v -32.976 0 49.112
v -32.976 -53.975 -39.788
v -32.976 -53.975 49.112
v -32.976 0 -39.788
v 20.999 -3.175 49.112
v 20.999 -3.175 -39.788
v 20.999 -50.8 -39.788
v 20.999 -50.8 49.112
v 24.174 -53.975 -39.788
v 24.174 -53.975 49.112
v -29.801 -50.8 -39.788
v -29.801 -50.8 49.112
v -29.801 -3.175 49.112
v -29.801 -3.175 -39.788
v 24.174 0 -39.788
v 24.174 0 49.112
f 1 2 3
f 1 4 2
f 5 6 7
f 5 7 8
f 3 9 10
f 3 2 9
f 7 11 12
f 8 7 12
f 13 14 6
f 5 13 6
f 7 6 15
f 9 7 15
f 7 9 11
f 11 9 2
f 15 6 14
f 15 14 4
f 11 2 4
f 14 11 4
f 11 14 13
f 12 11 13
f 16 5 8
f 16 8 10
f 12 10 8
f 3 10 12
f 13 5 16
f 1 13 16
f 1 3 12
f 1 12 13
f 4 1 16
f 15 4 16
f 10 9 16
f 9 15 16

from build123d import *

# Parameters (mm, degrees)
F0_W     = 57.15
F0_H     = 88.9
F1_DEPTH = 3.175
F2_W     = 3.175
F2_H     = 88.9
F3_DEPTH = 50.8
F4_W     = 3.175
F4_H     = 88.9
F5_DEPTH = 50.8
F6_W     = 3.175
F6_H     = 88.9
F7_DEPTH = 50.8


with BuildPart() as f1:
    # F0 (on Front) → F1 (new body)
    with BuildSketch(Plane.XZ):
        with Locations((-4.401278, 4.662237)):
            Rectangle(F0_W, F0_H)
    extrude(amount=F1_DEPTH)

    # F2 (on face) → F3 (join)
    with BuildSketch(Plane.XZ.offset(3.175)):
        with Locations((22.586222, 4.662237)):
            Rectangle(F2_W, F2_H)
    extrude(amount=F3_DEPTH)

    # F4 (on face) → F5 (join)
    with BuildSketch(Plane.XZ.offset(3.175)):
        with Locations((-31.388778, 4.662237)):
            Rectangle(F4_W, F4_H)
    extrude(amount=F5_DEPTH)

    # F6 (on face) → F7 (join)
    with BuildSketch(Plane.YZ.offset(-29.801278)):
        with Locations((-52.3875, 4.662237)):
            Rectangle(F6_W, F6_H)
    extrude(amount=F7_DEPTH)


solid = f1.part
